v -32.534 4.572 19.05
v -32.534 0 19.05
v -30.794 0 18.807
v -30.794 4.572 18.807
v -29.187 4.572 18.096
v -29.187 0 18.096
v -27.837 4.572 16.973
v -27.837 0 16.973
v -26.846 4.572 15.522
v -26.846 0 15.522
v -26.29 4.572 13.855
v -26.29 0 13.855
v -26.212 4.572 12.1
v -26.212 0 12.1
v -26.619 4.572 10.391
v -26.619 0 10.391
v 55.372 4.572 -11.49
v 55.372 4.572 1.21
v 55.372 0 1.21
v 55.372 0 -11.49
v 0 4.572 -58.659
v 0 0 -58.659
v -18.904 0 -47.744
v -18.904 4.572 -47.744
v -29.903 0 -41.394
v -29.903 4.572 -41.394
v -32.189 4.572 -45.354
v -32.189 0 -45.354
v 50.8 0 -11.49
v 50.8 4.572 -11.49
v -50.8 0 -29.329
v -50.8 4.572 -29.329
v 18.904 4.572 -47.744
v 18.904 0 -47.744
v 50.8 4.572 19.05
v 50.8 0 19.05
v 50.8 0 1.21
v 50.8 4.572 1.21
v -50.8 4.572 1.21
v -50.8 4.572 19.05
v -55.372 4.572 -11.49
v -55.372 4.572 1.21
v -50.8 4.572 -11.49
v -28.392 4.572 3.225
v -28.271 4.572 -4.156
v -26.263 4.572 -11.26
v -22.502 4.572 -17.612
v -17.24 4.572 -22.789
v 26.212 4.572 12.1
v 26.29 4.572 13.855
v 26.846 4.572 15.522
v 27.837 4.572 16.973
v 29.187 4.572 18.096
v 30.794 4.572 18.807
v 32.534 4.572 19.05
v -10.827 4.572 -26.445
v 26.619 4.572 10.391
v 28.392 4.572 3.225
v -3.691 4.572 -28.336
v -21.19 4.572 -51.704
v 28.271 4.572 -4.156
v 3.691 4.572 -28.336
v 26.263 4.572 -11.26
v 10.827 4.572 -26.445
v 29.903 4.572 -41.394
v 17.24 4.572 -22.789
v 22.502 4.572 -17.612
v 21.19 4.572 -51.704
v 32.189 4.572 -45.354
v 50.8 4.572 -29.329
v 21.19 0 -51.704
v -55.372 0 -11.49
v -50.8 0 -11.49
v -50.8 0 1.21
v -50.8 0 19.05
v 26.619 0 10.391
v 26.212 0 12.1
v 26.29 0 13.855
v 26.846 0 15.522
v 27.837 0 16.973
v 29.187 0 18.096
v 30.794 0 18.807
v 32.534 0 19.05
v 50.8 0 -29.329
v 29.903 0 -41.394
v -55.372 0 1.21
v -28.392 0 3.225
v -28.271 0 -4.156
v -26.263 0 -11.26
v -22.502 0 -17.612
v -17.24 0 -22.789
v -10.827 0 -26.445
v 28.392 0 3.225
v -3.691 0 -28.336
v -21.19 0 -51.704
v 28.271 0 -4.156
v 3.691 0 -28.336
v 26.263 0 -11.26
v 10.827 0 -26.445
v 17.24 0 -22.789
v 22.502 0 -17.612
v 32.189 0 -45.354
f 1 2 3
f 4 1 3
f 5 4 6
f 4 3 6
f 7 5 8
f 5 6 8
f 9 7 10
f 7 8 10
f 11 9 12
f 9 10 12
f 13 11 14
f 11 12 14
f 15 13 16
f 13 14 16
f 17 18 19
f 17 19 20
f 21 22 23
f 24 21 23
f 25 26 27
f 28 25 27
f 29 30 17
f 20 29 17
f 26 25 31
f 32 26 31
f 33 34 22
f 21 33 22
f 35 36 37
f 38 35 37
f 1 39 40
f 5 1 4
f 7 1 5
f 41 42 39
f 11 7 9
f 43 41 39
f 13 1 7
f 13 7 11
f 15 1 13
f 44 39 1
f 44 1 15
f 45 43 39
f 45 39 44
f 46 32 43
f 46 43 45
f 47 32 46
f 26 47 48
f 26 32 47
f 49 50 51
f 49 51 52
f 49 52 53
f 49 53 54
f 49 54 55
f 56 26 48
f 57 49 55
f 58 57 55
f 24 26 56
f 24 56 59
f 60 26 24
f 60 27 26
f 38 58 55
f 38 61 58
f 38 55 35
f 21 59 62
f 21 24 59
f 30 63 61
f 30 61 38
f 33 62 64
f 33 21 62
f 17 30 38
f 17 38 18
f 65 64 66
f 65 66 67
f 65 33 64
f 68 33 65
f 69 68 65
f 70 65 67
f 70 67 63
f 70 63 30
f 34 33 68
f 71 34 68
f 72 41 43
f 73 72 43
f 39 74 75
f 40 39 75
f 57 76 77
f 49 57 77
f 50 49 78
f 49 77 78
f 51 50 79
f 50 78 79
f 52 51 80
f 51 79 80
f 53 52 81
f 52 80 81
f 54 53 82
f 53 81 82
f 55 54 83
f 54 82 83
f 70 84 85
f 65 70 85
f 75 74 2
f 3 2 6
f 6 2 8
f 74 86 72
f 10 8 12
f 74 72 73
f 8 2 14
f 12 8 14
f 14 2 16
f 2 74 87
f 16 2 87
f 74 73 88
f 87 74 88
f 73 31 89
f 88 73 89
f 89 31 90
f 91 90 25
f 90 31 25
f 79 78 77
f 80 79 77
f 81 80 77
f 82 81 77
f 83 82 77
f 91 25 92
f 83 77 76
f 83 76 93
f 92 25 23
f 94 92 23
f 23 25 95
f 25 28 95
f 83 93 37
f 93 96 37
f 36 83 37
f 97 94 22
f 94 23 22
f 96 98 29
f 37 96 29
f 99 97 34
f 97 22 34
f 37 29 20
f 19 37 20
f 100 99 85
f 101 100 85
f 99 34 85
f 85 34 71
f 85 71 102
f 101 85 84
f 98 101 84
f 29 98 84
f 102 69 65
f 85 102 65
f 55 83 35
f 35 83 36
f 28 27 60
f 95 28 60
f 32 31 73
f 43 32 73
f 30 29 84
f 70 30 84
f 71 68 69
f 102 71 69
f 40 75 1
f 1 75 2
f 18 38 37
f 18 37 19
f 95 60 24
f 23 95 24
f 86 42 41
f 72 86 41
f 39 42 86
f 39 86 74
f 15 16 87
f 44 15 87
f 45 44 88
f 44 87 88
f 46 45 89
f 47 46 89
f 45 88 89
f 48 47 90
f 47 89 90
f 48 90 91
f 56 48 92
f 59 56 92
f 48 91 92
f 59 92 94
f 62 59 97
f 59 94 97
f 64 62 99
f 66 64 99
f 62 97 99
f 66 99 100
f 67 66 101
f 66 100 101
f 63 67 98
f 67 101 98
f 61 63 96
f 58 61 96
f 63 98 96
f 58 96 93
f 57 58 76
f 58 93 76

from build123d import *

# Parameters (mm, degrees)
BOSS_EXTRUDE1_DEPTH = 4.572
SKETCH2_W           = 4.572
SKETCH2_H           = 12.7
BOSS_EXTRUDE2_DEPTH = 4.572


with BuildPart() as part:
    # Sketch1 → Boss-Extrude1 (new body)
    with BuildSketch(Plane(origin=(0, 0, 0), x_dir=(1, 0, 0), z_dir=(0, 1, 0))):
        with BuildLine():
            Line((-50.8, -19.05), (-32.534068682, -19.05))
            ThreePointArc((-32.534068682, -19.05), (-27.290728751, -16.281883075), (-26.618783467, -10.390909091))
            ThreePointArc((-26.618783467, -10.390909091), (0, 28.575), (26.618783467, -10.390909091))
            ThreePointArc((26.618783467, -10.390909091), (27.290728751, -16.281883075), (32.534068682, -19.05))
            Line((32.534068682, -19.05), (50.8, -19.05))
            Line((50.8, -19.05), (50.8, 29.329393675))
            Line((50.8, 29.329393675), (0, 58.65878735))
            Line((0, 58.65878735), (-50.8, 29.329393675))
            Line((-50.8, 29.329393675), (-50.8, -19.05))
        make_face()
    extrude(amount=BOSS_EXTRUDE1_DEPTH)

    # Sketch2 → Boss-Extrude2 (add)
    with BuildSketch(Plane(origin=(0, 4.572, 0), x_dir=(1, 0, 0), z_dir=(0, 1, 0))):
        with Locations((-53.086, 5.139696837)):
            Rectangle(SKETCH2_W, SKETCH2_H)
        Polygon((-29.902807007, 41.394393675), (-32.188807007, 45.353861821), (-21.190284379, 51.703861821), (-18.904284379, 47.744393675), align=None)
        Polygon((18.904284379, 47.744393675), (21.190284379, 51.703861821), (32.188807007, 45.353861821), (29.902807007, 41.394393675), align=None)
        with Locations((53.086, 5.139696837)):
            Rectangle(SKETCH2_W, SKETCH2_H)
    extrude(amount=-BOSS_EXTRUDE2_DEPTH)


solid = part.part
